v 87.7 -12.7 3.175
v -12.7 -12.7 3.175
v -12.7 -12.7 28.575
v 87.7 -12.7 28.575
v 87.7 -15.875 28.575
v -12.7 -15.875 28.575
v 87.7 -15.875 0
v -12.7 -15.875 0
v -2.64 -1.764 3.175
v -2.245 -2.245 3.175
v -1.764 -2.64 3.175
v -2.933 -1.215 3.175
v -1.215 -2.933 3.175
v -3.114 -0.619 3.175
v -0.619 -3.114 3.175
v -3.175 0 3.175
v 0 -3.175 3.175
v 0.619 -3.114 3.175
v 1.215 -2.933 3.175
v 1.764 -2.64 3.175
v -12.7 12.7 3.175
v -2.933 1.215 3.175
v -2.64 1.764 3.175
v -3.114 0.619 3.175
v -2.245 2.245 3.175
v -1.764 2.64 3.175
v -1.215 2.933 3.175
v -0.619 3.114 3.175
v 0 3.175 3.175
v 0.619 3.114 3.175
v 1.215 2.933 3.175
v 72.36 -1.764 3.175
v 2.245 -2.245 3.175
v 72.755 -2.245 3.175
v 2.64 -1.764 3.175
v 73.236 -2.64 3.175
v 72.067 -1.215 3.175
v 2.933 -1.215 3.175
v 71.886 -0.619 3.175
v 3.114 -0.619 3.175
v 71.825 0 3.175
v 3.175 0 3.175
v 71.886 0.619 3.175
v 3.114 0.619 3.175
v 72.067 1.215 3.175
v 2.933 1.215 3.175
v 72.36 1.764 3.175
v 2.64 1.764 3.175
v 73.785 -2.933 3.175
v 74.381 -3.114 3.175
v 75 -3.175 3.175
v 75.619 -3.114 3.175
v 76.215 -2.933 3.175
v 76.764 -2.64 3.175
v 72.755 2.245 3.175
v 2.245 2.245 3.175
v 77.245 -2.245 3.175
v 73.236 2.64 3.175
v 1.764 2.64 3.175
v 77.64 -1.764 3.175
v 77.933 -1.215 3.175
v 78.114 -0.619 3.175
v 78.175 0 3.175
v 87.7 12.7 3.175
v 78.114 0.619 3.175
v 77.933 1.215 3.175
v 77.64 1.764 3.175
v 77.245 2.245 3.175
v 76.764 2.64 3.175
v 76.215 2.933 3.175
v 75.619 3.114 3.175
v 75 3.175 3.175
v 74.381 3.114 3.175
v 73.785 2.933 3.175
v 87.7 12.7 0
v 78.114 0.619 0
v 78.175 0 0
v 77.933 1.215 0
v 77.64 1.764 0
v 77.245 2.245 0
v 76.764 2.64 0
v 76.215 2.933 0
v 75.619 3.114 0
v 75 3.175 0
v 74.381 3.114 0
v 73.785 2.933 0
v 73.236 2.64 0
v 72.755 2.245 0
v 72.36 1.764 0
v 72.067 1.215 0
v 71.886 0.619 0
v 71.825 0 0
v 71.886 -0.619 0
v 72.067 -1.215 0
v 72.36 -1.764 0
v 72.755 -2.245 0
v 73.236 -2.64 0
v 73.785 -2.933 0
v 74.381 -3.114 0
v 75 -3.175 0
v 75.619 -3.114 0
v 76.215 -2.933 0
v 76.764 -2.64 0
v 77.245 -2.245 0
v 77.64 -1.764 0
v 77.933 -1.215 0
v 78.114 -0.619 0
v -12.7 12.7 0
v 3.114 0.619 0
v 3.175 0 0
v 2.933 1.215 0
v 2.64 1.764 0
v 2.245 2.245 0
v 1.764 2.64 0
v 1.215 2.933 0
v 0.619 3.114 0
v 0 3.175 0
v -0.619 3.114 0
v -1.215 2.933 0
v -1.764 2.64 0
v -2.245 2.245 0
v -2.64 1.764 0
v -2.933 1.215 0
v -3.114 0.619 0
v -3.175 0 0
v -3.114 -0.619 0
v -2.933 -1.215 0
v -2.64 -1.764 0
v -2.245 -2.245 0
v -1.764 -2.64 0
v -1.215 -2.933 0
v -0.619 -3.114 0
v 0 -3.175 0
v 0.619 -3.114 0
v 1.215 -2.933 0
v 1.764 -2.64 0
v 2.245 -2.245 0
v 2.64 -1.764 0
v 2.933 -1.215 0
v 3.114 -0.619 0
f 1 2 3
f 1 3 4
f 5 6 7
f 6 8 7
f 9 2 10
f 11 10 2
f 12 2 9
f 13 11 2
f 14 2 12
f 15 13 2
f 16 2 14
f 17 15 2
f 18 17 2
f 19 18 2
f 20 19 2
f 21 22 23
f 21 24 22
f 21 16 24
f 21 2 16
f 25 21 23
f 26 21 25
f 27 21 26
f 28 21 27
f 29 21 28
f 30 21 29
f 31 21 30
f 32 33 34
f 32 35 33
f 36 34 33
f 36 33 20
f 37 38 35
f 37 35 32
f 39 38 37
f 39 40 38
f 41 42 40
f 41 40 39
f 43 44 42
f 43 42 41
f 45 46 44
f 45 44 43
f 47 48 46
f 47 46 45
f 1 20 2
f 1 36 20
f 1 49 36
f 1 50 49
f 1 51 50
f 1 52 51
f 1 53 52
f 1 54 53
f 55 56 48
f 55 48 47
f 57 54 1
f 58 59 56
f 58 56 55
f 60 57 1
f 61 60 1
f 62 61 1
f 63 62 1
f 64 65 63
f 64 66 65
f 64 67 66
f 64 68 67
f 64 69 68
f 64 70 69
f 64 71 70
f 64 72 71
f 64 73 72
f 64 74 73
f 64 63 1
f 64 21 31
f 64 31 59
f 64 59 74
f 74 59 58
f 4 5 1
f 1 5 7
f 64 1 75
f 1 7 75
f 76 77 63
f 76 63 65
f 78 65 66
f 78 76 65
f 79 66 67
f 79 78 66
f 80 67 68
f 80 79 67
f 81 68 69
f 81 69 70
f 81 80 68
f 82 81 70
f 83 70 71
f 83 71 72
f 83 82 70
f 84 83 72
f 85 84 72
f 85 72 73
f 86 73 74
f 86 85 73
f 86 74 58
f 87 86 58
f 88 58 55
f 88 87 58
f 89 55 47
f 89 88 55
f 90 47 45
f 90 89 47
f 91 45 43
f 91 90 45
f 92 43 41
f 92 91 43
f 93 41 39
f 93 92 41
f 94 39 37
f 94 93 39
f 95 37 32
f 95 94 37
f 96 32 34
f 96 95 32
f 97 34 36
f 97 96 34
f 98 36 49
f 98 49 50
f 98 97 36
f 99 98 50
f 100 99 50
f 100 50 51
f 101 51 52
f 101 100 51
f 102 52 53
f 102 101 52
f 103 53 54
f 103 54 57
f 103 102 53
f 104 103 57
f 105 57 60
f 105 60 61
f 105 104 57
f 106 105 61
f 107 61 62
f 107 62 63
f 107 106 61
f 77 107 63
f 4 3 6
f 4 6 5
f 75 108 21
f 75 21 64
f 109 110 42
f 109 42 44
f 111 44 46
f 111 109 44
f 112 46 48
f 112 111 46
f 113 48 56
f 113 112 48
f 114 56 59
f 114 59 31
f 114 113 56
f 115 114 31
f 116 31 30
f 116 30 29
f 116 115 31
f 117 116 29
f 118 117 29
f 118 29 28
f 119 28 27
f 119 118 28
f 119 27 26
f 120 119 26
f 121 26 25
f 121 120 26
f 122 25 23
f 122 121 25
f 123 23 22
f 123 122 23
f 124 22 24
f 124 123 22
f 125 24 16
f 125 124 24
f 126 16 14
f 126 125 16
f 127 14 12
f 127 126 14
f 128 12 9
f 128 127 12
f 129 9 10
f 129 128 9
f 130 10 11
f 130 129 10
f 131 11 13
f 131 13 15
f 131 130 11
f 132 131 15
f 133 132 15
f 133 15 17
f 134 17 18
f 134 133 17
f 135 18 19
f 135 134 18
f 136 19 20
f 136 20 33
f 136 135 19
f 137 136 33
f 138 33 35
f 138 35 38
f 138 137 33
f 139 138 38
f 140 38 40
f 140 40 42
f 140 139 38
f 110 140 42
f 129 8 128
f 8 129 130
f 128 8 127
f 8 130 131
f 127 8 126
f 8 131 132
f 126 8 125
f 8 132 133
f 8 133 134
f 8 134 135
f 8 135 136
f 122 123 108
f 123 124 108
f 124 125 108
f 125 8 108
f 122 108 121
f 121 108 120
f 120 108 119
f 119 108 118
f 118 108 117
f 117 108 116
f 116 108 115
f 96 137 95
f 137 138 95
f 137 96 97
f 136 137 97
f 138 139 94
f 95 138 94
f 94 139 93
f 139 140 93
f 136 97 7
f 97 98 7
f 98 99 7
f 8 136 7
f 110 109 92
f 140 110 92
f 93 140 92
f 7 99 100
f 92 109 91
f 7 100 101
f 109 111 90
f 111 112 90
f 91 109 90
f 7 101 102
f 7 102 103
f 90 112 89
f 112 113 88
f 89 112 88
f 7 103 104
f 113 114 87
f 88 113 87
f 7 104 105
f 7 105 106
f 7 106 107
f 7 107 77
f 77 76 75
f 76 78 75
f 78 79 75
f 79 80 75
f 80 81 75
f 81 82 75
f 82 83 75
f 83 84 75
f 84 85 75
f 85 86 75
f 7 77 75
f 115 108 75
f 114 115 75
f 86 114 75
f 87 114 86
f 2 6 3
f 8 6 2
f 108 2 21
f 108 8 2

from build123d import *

# Parameters (mm, degrees)
SKETCH1_W           = 100.4
SKETCH1_H           = 28.575
SKETCH1_R           = 3.175
BOSS_EXTRUDE1_DEPTH = 3.175
SKETCH2_W           = 100.4
SKETCH2_H           = 3.175
BOSS_EXTRUDE2_DEPTH = 25.4


with BuildPart() as part:
    # Sketch1 → Boss-Extrude1 (new body)
    with BuildSketch(Plane.XY):
        with Locations((37.5, -1.5875)):
            Rectangle(SKETCH1_W, SKETCH1_H)
        Circle(SKETCH1_R, mode=Mode.SUBTRACT)
        with Locations((75, 0)):
            Circle(SKETCH1_R, mode=Mode.SUBTRACT)
    extrude(amount=BOSS_EXTRUDE1_DEPTH)

    # Sketch2 → Boss-Extrude2 (add)
    with BuildSketch(Plane.XY.offset(3.175)):
        with Locations((37.5, -14.2875)):
            Rectangle(SKETCH2_W, SKETCH2_H)
    extrude(amount=BOSS_EXTRUDE2_DEPTH)


solid = part.part
